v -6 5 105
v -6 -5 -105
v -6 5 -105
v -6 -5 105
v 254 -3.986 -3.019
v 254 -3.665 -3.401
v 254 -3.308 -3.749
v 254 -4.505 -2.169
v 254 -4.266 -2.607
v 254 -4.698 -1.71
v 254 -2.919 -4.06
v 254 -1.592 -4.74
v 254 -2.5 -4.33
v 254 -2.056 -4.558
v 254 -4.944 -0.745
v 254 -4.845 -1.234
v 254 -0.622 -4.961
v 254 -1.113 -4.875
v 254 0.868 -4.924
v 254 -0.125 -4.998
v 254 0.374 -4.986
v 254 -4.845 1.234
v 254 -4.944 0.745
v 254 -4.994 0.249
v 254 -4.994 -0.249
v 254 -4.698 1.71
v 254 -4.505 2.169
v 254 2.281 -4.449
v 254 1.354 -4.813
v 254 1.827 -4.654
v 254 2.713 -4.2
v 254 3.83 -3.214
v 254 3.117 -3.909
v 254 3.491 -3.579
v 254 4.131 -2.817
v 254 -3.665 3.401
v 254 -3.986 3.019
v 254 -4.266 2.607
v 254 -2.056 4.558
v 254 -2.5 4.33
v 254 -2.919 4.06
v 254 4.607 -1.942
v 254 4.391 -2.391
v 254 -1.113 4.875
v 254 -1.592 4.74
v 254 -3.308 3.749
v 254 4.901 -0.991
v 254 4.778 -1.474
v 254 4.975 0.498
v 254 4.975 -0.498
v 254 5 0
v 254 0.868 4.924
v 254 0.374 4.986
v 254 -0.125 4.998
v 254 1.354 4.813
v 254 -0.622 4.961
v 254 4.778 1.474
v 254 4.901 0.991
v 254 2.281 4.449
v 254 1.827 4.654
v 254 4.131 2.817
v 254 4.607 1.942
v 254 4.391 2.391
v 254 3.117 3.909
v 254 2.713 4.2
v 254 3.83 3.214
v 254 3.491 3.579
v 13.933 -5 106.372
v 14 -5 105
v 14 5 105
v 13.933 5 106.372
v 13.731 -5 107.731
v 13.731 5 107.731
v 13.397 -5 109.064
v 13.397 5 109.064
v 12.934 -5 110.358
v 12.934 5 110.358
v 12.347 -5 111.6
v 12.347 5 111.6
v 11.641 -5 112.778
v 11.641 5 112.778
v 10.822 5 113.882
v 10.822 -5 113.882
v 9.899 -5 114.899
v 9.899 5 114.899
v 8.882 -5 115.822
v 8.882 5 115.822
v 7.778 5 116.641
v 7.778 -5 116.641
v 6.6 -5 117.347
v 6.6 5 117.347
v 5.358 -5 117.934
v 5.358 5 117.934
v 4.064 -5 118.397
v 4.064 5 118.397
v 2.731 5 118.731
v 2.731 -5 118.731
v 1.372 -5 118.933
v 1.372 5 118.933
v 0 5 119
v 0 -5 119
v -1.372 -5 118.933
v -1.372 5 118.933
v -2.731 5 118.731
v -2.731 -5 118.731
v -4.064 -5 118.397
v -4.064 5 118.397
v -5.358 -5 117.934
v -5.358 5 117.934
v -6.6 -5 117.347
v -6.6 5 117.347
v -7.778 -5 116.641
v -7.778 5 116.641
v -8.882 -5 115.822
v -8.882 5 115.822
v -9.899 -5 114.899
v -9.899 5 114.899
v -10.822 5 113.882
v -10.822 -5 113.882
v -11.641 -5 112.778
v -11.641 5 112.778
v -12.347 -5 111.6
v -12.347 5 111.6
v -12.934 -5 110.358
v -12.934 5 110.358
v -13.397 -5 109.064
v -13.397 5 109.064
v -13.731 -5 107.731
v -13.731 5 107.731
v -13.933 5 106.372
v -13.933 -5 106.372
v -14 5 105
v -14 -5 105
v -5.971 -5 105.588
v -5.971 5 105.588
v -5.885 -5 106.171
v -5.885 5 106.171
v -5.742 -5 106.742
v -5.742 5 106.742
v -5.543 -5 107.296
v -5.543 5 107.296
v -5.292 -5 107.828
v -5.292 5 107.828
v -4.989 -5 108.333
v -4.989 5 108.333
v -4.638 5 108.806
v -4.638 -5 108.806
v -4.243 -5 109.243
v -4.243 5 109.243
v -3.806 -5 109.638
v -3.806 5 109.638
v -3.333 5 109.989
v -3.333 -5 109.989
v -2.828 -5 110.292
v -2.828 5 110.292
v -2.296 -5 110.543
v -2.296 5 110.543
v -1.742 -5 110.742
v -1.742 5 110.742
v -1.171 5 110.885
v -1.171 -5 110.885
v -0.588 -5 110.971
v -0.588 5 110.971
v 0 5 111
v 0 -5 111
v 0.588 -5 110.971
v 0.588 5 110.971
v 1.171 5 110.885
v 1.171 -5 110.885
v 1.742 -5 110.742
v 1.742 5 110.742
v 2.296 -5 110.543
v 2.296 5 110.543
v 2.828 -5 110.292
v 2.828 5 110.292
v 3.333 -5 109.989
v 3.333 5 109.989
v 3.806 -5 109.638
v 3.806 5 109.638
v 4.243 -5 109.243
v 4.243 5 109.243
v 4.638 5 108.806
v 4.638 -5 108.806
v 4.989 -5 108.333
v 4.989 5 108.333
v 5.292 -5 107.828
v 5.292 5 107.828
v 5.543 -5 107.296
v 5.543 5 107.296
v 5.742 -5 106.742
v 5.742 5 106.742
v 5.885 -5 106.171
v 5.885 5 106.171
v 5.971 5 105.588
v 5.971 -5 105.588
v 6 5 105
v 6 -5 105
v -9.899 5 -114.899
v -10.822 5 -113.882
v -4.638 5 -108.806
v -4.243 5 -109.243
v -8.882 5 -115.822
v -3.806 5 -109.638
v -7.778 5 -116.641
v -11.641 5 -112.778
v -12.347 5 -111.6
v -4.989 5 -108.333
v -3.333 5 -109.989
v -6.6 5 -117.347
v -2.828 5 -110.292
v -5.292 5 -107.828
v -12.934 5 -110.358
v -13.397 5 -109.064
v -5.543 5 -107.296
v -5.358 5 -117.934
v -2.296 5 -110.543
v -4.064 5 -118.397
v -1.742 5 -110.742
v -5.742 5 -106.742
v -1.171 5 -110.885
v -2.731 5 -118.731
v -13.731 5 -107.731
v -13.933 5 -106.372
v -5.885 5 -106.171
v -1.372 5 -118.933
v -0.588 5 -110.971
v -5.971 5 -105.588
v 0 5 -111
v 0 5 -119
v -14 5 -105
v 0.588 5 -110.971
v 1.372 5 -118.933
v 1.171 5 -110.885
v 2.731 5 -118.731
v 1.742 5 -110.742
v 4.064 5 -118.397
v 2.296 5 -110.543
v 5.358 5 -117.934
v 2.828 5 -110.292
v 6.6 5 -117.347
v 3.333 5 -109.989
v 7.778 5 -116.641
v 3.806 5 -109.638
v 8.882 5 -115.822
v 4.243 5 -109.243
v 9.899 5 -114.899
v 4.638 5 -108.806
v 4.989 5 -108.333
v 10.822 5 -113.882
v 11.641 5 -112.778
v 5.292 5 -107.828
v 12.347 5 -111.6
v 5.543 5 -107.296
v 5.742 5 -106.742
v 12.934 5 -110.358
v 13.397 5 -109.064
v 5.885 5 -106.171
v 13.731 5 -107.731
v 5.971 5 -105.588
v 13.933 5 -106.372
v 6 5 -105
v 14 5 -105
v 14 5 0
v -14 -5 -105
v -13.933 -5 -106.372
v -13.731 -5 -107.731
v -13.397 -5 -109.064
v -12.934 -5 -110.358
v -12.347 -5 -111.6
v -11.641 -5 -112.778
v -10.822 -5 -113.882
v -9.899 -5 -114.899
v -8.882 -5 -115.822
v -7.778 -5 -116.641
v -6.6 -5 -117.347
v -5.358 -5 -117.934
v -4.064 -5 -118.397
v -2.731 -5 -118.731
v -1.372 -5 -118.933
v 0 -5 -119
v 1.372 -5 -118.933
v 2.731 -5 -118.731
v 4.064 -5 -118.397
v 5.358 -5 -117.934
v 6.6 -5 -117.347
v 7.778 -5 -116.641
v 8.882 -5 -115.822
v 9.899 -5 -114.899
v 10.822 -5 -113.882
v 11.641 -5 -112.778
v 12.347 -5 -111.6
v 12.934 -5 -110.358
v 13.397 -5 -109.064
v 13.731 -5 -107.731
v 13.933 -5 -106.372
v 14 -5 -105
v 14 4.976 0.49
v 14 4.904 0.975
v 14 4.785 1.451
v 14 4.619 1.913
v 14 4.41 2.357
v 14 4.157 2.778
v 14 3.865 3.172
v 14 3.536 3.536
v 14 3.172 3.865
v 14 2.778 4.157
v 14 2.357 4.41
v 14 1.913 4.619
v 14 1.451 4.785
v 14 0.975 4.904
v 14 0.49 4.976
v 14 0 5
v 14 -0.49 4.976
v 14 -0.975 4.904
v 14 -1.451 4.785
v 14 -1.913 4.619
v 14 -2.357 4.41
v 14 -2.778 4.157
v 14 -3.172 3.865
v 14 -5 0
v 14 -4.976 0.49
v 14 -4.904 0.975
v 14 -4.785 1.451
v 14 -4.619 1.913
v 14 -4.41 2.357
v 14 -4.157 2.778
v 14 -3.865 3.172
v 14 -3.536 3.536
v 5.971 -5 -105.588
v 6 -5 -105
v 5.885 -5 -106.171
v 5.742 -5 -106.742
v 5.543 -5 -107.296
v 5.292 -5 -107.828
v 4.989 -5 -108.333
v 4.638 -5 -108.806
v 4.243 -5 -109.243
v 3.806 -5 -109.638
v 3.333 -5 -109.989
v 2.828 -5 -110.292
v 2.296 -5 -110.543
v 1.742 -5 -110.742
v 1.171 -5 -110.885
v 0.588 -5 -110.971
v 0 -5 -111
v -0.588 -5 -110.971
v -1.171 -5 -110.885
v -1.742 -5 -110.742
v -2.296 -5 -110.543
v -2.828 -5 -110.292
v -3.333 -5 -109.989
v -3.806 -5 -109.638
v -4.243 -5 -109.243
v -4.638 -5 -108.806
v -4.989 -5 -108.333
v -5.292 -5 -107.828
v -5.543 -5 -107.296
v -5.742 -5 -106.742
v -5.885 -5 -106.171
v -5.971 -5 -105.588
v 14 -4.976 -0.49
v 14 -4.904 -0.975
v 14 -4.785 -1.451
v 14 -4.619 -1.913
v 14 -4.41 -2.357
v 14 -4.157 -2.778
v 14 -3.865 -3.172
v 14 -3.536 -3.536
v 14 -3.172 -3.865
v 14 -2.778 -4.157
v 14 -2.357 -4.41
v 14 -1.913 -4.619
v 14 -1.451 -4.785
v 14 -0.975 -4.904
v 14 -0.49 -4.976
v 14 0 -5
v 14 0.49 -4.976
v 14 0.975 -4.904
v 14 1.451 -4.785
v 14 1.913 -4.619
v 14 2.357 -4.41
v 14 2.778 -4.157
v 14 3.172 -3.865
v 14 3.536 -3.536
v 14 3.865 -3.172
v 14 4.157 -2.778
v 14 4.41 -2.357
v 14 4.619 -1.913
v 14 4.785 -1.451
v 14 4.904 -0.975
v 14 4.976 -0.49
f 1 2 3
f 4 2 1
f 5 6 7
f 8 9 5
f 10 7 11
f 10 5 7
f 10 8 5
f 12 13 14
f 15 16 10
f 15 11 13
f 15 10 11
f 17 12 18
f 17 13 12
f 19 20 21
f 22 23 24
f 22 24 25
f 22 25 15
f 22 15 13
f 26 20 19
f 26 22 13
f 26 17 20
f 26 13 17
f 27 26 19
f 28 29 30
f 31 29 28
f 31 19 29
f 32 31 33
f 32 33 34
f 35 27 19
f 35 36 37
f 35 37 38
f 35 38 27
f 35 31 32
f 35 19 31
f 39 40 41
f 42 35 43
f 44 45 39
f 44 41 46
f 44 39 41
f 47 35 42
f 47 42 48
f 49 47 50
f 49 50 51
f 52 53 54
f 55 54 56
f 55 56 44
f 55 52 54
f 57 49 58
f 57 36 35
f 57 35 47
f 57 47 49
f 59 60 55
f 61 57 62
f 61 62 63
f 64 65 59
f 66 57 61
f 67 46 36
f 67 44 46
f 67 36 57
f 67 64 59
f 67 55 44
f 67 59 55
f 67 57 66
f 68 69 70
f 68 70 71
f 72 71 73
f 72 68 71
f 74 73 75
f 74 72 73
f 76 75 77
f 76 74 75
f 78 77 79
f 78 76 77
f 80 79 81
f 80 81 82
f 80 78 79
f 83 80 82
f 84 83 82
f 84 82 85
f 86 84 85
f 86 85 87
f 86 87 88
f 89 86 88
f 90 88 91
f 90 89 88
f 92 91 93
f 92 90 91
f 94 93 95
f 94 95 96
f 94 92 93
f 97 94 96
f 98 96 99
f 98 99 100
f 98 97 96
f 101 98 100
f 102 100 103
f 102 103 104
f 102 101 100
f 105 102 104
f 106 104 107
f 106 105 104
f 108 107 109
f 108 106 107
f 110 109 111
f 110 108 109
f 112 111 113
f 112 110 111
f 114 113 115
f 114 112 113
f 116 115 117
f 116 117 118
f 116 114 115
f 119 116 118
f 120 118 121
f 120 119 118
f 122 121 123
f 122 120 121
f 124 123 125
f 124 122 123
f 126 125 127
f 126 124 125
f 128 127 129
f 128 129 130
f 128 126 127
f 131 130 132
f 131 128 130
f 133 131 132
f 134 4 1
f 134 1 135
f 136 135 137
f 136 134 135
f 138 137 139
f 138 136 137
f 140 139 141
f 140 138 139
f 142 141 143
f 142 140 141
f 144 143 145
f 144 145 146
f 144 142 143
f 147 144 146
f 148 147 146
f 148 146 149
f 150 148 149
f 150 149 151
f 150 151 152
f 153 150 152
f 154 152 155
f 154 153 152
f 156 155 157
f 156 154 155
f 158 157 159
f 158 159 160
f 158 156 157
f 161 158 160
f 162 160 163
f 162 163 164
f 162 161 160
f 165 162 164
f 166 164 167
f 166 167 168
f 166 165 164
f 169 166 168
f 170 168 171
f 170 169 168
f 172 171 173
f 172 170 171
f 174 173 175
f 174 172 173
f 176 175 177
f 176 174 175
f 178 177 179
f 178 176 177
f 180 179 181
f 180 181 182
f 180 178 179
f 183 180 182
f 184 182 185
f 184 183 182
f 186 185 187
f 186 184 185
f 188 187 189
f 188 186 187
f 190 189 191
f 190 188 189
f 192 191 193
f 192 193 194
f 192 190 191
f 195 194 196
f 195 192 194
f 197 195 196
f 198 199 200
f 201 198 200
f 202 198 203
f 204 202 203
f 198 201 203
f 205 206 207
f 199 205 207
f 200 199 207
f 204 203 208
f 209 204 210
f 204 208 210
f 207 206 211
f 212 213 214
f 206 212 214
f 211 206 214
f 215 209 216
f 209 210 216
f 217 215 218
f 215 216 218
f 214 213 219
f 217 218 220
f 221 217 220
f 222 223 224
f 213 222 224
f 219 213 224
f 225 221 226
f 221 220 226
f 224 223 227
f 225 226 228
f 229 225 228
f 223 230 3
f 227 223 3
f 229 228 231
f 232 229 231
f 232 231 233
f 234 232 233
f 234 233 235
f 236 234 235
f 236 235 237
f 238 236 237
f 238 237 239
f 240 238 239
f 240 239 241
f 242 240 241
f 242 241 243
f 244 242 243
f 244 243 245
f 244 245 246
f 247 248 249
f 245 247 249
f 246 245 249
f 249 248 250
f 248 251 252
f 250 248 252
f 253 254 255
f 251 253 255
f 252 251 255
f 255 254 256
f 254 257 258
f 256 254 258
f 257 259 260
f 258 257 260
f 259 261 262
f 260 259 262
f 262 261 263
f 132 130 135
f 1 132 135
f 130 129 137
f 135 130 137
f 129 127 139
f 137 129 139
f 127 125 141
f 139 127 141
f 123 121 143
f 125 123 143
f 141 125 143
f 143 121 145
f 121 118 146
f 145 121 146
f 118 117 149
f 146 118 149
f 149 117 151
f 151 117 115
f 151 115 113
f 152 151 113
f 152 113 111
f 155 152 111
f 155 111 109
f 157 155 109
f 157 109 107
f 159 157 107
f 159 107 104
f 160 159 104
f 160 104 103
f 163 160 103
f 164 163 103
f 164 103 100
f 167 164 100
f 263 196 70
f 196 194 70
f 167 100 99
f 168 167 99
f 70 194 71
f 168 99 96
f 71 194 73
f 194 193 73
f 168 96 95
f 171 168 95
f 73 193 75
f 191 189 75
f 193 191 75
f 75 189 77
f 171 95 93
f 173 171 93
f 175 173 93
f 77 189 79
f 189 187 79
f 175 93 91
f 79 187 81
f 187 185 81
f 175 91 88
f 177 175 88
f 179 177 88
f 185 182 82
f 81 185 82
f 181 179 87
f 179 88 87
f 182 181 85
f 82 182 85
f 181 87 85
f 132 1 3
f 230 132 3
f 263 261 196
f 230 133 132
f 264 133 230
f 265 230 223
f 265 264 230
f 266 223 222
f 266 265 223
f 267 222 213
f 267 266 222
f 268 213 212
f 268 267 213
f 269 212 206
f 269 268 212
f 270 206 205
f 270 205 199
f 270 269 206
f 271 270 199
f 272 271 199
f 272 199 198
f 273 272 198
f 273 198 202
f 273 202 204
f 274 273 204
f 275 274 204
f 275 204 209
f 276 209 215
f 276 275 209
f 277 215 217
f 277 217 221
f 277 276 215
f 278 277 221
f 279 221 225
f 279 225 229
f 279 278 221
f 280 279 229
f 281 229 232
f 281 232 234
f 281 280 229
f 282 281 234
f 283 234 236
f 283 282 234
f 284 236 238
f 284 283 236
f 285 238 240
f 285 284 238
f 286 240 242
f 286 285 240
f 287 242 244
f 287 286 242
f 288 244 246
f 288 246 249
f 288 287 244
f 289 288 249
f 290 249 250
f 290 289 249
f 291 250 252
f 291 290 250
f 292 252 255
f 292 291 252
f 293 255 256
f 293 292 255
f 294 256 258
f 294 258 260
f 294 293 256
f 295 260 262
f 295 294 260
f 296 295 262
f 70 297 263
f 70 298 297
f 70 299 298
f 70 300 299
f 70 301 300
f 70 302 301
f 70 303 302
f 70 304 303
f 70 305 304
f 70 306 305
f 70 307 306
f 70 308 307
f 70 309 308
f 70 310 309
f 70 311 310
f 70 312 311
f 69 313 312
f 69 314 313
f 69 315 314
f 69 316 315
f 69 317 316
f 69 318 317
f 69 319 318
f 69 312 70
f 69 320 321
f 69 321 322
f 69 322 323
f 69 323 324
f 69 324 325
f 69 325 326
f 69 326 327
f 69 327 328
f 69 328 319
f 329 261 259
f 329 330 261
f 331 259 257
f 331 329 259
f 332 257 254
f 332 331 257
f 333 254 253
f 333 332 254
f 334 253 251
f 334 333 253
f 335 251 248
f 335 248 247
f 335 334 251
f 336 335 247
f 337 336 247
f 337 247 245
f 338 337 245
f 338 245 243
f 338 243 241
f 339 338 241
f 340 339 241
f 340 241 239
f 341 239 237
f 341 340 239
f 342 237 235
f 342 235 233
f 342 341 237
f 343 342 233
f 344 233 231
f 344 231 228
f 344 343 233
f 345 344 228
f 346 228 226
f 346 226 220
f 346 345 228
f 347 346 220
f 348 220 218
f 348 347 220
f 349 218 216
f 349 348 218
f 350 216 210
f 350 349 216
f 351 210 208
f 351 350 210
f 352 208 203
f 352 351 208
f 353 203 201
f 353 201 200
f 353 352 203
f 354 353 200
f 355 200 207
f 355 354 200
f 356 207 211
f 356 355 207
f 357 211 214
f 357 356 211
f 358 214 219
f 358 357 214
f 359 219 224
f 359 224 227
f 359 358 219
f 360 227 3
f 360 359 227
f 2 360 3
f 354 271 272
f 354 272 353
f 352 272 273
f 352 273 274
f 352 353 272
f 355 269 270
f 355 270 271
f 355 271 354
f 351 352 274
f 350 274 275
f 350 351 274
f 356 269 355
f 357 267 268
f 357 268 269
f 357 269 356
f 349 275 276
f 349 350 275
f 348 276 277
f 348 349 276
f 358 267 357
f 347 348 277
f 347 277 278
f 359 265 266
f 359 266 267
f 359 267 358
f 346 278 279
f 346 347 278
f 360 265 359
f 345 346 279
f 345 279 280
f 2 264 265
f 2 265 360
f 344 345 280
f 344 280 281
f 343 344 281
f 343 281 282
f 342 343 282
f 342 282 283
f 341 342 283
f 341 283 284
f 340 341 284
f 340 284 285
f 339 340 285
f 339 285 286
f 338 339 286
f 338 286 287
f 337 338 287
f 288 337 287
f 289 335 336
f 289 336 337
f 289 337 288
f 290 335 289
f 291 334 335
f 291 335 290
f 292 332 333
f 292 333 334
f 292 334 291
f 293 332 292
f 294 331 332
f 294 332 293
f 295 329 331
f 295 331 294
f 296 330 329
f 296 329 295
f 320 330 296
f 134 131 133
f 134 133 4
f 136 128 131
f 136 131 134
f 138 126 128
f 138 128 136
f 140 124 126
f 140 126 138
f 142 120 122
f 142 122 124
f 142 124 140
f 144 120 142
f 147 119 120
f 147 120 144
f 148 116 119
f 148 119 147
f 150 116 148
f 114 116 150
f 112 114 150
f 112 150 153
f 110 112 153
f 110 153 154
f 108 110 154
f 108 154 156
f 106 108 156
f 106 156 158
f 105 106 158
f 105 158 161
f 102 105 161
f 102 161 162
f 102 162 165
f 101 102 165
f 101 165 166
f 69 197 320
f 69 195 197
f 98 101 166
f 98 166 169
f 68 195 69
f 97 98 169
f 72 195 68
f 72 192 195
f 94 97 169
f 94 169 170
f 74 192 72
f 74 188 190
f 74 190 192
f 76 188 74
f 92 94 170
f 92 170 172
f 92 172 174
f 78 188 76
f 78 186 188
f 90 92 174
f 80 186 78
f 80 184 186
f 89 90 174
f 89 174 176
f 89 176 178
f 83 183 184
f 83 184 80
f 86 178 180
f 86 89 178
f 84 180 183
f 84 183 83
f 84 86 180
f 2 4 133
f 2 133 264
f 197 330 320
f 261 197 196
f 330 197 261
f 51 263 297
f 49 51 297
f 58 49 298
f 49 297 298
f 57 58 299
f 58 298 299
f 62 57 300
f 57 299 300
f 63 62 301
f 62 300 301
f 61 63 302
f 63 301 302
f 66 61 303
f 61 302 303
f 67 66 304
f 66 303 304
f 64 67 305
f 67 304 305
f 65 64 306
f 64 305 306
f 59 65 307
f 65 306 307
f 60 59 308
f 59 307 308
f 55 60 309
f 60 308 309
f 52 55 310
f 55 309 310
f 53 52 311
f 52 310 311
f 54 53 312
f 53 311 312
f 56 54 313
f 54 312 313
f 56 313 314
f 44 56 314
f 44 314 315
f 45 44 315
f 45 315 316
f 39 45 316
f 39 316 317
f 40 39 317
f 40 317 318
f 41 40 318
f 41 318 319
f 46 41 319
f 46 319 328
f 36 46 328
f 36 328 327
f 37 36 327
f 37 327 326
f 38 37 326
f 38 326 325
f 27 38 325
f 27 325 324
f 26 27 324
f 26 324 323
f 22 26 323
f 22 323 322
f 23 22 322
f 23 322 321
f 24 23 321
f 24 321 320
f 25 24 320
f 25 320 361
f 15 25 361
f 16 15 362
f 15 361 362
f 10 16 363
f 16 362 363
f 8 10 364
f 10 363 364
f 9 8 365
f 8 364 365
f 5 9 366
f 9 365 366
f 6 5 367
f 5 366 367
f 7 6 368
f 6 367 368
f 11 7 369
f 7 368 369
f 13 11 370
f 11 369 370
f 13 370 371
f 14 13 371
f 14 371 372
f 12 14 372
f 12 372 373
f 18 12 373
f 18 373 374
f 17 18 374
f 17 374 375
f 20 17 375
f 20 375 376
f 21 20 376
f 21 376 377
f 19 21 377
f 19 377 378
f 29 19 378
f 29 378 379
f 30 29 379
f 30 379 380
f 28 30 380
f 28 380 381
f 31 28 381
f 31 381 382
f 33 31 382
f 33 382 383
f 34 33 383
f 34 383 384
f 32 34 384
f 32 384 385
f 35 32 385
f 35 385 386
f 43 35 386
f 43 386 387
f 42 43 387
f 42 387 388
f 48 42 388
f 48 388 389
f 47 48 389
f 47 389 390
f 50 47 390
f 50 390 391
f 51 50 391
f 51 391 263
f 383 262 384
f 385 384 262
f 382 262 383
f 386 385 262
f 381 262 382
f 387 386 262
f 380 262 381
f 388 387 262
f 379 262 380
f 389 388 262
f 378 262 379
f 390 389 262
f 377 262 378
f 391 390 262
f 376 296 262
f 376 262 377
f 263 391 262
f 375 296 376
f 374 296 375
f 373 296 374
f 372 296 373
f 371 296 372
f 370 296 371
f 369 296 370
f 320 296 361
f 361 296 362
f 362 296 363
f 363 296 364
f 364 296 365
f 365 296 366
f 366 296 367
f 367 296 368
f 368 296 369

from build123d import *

# Parameters (mm, degrees)
F1_DEPTH = 5
F3_DEPTH = 240


with BuildPart() as f1:
    # F0 (on Front) → F1 (new body, symmetric)
    with BuildSketch(Plane.XZ):
        with BuildLine():
            Line((14, -105), (14, 105))
            ThreePointArc((14, 105), (0, 119), (-14, 105))
            Line((-14, 105), (-14, -105))
            ThreePointArc((-14, -105), (0, -119), (14, -105))
        make_face()
        with BuildLine():
            ThreePointArc((-6, 105), (0, 111), (6, 105))
            Line((6, 105), (6, -105))
            ThreePointArc((6, -105), (0, -111), (-6, -105))
            Line((-6, -105), (-6, 105))
        make_face(mode=Mode.SUBTRACT)
    extrude(amount=F1_DEPTH, both=True)

    # F2 (on face) → F3 (join)
    with BuildSketch(Plane.YZ.offset(14)):
        with BuildLine():
            ThreePointArc((-5, 0), (0, -5), (5, 0))
            ThreePointArc((5, 0), (0, 5), (-5, 0))
        make_face()
    extrude(amount=F3_DEPTH)


solid = f1.part
